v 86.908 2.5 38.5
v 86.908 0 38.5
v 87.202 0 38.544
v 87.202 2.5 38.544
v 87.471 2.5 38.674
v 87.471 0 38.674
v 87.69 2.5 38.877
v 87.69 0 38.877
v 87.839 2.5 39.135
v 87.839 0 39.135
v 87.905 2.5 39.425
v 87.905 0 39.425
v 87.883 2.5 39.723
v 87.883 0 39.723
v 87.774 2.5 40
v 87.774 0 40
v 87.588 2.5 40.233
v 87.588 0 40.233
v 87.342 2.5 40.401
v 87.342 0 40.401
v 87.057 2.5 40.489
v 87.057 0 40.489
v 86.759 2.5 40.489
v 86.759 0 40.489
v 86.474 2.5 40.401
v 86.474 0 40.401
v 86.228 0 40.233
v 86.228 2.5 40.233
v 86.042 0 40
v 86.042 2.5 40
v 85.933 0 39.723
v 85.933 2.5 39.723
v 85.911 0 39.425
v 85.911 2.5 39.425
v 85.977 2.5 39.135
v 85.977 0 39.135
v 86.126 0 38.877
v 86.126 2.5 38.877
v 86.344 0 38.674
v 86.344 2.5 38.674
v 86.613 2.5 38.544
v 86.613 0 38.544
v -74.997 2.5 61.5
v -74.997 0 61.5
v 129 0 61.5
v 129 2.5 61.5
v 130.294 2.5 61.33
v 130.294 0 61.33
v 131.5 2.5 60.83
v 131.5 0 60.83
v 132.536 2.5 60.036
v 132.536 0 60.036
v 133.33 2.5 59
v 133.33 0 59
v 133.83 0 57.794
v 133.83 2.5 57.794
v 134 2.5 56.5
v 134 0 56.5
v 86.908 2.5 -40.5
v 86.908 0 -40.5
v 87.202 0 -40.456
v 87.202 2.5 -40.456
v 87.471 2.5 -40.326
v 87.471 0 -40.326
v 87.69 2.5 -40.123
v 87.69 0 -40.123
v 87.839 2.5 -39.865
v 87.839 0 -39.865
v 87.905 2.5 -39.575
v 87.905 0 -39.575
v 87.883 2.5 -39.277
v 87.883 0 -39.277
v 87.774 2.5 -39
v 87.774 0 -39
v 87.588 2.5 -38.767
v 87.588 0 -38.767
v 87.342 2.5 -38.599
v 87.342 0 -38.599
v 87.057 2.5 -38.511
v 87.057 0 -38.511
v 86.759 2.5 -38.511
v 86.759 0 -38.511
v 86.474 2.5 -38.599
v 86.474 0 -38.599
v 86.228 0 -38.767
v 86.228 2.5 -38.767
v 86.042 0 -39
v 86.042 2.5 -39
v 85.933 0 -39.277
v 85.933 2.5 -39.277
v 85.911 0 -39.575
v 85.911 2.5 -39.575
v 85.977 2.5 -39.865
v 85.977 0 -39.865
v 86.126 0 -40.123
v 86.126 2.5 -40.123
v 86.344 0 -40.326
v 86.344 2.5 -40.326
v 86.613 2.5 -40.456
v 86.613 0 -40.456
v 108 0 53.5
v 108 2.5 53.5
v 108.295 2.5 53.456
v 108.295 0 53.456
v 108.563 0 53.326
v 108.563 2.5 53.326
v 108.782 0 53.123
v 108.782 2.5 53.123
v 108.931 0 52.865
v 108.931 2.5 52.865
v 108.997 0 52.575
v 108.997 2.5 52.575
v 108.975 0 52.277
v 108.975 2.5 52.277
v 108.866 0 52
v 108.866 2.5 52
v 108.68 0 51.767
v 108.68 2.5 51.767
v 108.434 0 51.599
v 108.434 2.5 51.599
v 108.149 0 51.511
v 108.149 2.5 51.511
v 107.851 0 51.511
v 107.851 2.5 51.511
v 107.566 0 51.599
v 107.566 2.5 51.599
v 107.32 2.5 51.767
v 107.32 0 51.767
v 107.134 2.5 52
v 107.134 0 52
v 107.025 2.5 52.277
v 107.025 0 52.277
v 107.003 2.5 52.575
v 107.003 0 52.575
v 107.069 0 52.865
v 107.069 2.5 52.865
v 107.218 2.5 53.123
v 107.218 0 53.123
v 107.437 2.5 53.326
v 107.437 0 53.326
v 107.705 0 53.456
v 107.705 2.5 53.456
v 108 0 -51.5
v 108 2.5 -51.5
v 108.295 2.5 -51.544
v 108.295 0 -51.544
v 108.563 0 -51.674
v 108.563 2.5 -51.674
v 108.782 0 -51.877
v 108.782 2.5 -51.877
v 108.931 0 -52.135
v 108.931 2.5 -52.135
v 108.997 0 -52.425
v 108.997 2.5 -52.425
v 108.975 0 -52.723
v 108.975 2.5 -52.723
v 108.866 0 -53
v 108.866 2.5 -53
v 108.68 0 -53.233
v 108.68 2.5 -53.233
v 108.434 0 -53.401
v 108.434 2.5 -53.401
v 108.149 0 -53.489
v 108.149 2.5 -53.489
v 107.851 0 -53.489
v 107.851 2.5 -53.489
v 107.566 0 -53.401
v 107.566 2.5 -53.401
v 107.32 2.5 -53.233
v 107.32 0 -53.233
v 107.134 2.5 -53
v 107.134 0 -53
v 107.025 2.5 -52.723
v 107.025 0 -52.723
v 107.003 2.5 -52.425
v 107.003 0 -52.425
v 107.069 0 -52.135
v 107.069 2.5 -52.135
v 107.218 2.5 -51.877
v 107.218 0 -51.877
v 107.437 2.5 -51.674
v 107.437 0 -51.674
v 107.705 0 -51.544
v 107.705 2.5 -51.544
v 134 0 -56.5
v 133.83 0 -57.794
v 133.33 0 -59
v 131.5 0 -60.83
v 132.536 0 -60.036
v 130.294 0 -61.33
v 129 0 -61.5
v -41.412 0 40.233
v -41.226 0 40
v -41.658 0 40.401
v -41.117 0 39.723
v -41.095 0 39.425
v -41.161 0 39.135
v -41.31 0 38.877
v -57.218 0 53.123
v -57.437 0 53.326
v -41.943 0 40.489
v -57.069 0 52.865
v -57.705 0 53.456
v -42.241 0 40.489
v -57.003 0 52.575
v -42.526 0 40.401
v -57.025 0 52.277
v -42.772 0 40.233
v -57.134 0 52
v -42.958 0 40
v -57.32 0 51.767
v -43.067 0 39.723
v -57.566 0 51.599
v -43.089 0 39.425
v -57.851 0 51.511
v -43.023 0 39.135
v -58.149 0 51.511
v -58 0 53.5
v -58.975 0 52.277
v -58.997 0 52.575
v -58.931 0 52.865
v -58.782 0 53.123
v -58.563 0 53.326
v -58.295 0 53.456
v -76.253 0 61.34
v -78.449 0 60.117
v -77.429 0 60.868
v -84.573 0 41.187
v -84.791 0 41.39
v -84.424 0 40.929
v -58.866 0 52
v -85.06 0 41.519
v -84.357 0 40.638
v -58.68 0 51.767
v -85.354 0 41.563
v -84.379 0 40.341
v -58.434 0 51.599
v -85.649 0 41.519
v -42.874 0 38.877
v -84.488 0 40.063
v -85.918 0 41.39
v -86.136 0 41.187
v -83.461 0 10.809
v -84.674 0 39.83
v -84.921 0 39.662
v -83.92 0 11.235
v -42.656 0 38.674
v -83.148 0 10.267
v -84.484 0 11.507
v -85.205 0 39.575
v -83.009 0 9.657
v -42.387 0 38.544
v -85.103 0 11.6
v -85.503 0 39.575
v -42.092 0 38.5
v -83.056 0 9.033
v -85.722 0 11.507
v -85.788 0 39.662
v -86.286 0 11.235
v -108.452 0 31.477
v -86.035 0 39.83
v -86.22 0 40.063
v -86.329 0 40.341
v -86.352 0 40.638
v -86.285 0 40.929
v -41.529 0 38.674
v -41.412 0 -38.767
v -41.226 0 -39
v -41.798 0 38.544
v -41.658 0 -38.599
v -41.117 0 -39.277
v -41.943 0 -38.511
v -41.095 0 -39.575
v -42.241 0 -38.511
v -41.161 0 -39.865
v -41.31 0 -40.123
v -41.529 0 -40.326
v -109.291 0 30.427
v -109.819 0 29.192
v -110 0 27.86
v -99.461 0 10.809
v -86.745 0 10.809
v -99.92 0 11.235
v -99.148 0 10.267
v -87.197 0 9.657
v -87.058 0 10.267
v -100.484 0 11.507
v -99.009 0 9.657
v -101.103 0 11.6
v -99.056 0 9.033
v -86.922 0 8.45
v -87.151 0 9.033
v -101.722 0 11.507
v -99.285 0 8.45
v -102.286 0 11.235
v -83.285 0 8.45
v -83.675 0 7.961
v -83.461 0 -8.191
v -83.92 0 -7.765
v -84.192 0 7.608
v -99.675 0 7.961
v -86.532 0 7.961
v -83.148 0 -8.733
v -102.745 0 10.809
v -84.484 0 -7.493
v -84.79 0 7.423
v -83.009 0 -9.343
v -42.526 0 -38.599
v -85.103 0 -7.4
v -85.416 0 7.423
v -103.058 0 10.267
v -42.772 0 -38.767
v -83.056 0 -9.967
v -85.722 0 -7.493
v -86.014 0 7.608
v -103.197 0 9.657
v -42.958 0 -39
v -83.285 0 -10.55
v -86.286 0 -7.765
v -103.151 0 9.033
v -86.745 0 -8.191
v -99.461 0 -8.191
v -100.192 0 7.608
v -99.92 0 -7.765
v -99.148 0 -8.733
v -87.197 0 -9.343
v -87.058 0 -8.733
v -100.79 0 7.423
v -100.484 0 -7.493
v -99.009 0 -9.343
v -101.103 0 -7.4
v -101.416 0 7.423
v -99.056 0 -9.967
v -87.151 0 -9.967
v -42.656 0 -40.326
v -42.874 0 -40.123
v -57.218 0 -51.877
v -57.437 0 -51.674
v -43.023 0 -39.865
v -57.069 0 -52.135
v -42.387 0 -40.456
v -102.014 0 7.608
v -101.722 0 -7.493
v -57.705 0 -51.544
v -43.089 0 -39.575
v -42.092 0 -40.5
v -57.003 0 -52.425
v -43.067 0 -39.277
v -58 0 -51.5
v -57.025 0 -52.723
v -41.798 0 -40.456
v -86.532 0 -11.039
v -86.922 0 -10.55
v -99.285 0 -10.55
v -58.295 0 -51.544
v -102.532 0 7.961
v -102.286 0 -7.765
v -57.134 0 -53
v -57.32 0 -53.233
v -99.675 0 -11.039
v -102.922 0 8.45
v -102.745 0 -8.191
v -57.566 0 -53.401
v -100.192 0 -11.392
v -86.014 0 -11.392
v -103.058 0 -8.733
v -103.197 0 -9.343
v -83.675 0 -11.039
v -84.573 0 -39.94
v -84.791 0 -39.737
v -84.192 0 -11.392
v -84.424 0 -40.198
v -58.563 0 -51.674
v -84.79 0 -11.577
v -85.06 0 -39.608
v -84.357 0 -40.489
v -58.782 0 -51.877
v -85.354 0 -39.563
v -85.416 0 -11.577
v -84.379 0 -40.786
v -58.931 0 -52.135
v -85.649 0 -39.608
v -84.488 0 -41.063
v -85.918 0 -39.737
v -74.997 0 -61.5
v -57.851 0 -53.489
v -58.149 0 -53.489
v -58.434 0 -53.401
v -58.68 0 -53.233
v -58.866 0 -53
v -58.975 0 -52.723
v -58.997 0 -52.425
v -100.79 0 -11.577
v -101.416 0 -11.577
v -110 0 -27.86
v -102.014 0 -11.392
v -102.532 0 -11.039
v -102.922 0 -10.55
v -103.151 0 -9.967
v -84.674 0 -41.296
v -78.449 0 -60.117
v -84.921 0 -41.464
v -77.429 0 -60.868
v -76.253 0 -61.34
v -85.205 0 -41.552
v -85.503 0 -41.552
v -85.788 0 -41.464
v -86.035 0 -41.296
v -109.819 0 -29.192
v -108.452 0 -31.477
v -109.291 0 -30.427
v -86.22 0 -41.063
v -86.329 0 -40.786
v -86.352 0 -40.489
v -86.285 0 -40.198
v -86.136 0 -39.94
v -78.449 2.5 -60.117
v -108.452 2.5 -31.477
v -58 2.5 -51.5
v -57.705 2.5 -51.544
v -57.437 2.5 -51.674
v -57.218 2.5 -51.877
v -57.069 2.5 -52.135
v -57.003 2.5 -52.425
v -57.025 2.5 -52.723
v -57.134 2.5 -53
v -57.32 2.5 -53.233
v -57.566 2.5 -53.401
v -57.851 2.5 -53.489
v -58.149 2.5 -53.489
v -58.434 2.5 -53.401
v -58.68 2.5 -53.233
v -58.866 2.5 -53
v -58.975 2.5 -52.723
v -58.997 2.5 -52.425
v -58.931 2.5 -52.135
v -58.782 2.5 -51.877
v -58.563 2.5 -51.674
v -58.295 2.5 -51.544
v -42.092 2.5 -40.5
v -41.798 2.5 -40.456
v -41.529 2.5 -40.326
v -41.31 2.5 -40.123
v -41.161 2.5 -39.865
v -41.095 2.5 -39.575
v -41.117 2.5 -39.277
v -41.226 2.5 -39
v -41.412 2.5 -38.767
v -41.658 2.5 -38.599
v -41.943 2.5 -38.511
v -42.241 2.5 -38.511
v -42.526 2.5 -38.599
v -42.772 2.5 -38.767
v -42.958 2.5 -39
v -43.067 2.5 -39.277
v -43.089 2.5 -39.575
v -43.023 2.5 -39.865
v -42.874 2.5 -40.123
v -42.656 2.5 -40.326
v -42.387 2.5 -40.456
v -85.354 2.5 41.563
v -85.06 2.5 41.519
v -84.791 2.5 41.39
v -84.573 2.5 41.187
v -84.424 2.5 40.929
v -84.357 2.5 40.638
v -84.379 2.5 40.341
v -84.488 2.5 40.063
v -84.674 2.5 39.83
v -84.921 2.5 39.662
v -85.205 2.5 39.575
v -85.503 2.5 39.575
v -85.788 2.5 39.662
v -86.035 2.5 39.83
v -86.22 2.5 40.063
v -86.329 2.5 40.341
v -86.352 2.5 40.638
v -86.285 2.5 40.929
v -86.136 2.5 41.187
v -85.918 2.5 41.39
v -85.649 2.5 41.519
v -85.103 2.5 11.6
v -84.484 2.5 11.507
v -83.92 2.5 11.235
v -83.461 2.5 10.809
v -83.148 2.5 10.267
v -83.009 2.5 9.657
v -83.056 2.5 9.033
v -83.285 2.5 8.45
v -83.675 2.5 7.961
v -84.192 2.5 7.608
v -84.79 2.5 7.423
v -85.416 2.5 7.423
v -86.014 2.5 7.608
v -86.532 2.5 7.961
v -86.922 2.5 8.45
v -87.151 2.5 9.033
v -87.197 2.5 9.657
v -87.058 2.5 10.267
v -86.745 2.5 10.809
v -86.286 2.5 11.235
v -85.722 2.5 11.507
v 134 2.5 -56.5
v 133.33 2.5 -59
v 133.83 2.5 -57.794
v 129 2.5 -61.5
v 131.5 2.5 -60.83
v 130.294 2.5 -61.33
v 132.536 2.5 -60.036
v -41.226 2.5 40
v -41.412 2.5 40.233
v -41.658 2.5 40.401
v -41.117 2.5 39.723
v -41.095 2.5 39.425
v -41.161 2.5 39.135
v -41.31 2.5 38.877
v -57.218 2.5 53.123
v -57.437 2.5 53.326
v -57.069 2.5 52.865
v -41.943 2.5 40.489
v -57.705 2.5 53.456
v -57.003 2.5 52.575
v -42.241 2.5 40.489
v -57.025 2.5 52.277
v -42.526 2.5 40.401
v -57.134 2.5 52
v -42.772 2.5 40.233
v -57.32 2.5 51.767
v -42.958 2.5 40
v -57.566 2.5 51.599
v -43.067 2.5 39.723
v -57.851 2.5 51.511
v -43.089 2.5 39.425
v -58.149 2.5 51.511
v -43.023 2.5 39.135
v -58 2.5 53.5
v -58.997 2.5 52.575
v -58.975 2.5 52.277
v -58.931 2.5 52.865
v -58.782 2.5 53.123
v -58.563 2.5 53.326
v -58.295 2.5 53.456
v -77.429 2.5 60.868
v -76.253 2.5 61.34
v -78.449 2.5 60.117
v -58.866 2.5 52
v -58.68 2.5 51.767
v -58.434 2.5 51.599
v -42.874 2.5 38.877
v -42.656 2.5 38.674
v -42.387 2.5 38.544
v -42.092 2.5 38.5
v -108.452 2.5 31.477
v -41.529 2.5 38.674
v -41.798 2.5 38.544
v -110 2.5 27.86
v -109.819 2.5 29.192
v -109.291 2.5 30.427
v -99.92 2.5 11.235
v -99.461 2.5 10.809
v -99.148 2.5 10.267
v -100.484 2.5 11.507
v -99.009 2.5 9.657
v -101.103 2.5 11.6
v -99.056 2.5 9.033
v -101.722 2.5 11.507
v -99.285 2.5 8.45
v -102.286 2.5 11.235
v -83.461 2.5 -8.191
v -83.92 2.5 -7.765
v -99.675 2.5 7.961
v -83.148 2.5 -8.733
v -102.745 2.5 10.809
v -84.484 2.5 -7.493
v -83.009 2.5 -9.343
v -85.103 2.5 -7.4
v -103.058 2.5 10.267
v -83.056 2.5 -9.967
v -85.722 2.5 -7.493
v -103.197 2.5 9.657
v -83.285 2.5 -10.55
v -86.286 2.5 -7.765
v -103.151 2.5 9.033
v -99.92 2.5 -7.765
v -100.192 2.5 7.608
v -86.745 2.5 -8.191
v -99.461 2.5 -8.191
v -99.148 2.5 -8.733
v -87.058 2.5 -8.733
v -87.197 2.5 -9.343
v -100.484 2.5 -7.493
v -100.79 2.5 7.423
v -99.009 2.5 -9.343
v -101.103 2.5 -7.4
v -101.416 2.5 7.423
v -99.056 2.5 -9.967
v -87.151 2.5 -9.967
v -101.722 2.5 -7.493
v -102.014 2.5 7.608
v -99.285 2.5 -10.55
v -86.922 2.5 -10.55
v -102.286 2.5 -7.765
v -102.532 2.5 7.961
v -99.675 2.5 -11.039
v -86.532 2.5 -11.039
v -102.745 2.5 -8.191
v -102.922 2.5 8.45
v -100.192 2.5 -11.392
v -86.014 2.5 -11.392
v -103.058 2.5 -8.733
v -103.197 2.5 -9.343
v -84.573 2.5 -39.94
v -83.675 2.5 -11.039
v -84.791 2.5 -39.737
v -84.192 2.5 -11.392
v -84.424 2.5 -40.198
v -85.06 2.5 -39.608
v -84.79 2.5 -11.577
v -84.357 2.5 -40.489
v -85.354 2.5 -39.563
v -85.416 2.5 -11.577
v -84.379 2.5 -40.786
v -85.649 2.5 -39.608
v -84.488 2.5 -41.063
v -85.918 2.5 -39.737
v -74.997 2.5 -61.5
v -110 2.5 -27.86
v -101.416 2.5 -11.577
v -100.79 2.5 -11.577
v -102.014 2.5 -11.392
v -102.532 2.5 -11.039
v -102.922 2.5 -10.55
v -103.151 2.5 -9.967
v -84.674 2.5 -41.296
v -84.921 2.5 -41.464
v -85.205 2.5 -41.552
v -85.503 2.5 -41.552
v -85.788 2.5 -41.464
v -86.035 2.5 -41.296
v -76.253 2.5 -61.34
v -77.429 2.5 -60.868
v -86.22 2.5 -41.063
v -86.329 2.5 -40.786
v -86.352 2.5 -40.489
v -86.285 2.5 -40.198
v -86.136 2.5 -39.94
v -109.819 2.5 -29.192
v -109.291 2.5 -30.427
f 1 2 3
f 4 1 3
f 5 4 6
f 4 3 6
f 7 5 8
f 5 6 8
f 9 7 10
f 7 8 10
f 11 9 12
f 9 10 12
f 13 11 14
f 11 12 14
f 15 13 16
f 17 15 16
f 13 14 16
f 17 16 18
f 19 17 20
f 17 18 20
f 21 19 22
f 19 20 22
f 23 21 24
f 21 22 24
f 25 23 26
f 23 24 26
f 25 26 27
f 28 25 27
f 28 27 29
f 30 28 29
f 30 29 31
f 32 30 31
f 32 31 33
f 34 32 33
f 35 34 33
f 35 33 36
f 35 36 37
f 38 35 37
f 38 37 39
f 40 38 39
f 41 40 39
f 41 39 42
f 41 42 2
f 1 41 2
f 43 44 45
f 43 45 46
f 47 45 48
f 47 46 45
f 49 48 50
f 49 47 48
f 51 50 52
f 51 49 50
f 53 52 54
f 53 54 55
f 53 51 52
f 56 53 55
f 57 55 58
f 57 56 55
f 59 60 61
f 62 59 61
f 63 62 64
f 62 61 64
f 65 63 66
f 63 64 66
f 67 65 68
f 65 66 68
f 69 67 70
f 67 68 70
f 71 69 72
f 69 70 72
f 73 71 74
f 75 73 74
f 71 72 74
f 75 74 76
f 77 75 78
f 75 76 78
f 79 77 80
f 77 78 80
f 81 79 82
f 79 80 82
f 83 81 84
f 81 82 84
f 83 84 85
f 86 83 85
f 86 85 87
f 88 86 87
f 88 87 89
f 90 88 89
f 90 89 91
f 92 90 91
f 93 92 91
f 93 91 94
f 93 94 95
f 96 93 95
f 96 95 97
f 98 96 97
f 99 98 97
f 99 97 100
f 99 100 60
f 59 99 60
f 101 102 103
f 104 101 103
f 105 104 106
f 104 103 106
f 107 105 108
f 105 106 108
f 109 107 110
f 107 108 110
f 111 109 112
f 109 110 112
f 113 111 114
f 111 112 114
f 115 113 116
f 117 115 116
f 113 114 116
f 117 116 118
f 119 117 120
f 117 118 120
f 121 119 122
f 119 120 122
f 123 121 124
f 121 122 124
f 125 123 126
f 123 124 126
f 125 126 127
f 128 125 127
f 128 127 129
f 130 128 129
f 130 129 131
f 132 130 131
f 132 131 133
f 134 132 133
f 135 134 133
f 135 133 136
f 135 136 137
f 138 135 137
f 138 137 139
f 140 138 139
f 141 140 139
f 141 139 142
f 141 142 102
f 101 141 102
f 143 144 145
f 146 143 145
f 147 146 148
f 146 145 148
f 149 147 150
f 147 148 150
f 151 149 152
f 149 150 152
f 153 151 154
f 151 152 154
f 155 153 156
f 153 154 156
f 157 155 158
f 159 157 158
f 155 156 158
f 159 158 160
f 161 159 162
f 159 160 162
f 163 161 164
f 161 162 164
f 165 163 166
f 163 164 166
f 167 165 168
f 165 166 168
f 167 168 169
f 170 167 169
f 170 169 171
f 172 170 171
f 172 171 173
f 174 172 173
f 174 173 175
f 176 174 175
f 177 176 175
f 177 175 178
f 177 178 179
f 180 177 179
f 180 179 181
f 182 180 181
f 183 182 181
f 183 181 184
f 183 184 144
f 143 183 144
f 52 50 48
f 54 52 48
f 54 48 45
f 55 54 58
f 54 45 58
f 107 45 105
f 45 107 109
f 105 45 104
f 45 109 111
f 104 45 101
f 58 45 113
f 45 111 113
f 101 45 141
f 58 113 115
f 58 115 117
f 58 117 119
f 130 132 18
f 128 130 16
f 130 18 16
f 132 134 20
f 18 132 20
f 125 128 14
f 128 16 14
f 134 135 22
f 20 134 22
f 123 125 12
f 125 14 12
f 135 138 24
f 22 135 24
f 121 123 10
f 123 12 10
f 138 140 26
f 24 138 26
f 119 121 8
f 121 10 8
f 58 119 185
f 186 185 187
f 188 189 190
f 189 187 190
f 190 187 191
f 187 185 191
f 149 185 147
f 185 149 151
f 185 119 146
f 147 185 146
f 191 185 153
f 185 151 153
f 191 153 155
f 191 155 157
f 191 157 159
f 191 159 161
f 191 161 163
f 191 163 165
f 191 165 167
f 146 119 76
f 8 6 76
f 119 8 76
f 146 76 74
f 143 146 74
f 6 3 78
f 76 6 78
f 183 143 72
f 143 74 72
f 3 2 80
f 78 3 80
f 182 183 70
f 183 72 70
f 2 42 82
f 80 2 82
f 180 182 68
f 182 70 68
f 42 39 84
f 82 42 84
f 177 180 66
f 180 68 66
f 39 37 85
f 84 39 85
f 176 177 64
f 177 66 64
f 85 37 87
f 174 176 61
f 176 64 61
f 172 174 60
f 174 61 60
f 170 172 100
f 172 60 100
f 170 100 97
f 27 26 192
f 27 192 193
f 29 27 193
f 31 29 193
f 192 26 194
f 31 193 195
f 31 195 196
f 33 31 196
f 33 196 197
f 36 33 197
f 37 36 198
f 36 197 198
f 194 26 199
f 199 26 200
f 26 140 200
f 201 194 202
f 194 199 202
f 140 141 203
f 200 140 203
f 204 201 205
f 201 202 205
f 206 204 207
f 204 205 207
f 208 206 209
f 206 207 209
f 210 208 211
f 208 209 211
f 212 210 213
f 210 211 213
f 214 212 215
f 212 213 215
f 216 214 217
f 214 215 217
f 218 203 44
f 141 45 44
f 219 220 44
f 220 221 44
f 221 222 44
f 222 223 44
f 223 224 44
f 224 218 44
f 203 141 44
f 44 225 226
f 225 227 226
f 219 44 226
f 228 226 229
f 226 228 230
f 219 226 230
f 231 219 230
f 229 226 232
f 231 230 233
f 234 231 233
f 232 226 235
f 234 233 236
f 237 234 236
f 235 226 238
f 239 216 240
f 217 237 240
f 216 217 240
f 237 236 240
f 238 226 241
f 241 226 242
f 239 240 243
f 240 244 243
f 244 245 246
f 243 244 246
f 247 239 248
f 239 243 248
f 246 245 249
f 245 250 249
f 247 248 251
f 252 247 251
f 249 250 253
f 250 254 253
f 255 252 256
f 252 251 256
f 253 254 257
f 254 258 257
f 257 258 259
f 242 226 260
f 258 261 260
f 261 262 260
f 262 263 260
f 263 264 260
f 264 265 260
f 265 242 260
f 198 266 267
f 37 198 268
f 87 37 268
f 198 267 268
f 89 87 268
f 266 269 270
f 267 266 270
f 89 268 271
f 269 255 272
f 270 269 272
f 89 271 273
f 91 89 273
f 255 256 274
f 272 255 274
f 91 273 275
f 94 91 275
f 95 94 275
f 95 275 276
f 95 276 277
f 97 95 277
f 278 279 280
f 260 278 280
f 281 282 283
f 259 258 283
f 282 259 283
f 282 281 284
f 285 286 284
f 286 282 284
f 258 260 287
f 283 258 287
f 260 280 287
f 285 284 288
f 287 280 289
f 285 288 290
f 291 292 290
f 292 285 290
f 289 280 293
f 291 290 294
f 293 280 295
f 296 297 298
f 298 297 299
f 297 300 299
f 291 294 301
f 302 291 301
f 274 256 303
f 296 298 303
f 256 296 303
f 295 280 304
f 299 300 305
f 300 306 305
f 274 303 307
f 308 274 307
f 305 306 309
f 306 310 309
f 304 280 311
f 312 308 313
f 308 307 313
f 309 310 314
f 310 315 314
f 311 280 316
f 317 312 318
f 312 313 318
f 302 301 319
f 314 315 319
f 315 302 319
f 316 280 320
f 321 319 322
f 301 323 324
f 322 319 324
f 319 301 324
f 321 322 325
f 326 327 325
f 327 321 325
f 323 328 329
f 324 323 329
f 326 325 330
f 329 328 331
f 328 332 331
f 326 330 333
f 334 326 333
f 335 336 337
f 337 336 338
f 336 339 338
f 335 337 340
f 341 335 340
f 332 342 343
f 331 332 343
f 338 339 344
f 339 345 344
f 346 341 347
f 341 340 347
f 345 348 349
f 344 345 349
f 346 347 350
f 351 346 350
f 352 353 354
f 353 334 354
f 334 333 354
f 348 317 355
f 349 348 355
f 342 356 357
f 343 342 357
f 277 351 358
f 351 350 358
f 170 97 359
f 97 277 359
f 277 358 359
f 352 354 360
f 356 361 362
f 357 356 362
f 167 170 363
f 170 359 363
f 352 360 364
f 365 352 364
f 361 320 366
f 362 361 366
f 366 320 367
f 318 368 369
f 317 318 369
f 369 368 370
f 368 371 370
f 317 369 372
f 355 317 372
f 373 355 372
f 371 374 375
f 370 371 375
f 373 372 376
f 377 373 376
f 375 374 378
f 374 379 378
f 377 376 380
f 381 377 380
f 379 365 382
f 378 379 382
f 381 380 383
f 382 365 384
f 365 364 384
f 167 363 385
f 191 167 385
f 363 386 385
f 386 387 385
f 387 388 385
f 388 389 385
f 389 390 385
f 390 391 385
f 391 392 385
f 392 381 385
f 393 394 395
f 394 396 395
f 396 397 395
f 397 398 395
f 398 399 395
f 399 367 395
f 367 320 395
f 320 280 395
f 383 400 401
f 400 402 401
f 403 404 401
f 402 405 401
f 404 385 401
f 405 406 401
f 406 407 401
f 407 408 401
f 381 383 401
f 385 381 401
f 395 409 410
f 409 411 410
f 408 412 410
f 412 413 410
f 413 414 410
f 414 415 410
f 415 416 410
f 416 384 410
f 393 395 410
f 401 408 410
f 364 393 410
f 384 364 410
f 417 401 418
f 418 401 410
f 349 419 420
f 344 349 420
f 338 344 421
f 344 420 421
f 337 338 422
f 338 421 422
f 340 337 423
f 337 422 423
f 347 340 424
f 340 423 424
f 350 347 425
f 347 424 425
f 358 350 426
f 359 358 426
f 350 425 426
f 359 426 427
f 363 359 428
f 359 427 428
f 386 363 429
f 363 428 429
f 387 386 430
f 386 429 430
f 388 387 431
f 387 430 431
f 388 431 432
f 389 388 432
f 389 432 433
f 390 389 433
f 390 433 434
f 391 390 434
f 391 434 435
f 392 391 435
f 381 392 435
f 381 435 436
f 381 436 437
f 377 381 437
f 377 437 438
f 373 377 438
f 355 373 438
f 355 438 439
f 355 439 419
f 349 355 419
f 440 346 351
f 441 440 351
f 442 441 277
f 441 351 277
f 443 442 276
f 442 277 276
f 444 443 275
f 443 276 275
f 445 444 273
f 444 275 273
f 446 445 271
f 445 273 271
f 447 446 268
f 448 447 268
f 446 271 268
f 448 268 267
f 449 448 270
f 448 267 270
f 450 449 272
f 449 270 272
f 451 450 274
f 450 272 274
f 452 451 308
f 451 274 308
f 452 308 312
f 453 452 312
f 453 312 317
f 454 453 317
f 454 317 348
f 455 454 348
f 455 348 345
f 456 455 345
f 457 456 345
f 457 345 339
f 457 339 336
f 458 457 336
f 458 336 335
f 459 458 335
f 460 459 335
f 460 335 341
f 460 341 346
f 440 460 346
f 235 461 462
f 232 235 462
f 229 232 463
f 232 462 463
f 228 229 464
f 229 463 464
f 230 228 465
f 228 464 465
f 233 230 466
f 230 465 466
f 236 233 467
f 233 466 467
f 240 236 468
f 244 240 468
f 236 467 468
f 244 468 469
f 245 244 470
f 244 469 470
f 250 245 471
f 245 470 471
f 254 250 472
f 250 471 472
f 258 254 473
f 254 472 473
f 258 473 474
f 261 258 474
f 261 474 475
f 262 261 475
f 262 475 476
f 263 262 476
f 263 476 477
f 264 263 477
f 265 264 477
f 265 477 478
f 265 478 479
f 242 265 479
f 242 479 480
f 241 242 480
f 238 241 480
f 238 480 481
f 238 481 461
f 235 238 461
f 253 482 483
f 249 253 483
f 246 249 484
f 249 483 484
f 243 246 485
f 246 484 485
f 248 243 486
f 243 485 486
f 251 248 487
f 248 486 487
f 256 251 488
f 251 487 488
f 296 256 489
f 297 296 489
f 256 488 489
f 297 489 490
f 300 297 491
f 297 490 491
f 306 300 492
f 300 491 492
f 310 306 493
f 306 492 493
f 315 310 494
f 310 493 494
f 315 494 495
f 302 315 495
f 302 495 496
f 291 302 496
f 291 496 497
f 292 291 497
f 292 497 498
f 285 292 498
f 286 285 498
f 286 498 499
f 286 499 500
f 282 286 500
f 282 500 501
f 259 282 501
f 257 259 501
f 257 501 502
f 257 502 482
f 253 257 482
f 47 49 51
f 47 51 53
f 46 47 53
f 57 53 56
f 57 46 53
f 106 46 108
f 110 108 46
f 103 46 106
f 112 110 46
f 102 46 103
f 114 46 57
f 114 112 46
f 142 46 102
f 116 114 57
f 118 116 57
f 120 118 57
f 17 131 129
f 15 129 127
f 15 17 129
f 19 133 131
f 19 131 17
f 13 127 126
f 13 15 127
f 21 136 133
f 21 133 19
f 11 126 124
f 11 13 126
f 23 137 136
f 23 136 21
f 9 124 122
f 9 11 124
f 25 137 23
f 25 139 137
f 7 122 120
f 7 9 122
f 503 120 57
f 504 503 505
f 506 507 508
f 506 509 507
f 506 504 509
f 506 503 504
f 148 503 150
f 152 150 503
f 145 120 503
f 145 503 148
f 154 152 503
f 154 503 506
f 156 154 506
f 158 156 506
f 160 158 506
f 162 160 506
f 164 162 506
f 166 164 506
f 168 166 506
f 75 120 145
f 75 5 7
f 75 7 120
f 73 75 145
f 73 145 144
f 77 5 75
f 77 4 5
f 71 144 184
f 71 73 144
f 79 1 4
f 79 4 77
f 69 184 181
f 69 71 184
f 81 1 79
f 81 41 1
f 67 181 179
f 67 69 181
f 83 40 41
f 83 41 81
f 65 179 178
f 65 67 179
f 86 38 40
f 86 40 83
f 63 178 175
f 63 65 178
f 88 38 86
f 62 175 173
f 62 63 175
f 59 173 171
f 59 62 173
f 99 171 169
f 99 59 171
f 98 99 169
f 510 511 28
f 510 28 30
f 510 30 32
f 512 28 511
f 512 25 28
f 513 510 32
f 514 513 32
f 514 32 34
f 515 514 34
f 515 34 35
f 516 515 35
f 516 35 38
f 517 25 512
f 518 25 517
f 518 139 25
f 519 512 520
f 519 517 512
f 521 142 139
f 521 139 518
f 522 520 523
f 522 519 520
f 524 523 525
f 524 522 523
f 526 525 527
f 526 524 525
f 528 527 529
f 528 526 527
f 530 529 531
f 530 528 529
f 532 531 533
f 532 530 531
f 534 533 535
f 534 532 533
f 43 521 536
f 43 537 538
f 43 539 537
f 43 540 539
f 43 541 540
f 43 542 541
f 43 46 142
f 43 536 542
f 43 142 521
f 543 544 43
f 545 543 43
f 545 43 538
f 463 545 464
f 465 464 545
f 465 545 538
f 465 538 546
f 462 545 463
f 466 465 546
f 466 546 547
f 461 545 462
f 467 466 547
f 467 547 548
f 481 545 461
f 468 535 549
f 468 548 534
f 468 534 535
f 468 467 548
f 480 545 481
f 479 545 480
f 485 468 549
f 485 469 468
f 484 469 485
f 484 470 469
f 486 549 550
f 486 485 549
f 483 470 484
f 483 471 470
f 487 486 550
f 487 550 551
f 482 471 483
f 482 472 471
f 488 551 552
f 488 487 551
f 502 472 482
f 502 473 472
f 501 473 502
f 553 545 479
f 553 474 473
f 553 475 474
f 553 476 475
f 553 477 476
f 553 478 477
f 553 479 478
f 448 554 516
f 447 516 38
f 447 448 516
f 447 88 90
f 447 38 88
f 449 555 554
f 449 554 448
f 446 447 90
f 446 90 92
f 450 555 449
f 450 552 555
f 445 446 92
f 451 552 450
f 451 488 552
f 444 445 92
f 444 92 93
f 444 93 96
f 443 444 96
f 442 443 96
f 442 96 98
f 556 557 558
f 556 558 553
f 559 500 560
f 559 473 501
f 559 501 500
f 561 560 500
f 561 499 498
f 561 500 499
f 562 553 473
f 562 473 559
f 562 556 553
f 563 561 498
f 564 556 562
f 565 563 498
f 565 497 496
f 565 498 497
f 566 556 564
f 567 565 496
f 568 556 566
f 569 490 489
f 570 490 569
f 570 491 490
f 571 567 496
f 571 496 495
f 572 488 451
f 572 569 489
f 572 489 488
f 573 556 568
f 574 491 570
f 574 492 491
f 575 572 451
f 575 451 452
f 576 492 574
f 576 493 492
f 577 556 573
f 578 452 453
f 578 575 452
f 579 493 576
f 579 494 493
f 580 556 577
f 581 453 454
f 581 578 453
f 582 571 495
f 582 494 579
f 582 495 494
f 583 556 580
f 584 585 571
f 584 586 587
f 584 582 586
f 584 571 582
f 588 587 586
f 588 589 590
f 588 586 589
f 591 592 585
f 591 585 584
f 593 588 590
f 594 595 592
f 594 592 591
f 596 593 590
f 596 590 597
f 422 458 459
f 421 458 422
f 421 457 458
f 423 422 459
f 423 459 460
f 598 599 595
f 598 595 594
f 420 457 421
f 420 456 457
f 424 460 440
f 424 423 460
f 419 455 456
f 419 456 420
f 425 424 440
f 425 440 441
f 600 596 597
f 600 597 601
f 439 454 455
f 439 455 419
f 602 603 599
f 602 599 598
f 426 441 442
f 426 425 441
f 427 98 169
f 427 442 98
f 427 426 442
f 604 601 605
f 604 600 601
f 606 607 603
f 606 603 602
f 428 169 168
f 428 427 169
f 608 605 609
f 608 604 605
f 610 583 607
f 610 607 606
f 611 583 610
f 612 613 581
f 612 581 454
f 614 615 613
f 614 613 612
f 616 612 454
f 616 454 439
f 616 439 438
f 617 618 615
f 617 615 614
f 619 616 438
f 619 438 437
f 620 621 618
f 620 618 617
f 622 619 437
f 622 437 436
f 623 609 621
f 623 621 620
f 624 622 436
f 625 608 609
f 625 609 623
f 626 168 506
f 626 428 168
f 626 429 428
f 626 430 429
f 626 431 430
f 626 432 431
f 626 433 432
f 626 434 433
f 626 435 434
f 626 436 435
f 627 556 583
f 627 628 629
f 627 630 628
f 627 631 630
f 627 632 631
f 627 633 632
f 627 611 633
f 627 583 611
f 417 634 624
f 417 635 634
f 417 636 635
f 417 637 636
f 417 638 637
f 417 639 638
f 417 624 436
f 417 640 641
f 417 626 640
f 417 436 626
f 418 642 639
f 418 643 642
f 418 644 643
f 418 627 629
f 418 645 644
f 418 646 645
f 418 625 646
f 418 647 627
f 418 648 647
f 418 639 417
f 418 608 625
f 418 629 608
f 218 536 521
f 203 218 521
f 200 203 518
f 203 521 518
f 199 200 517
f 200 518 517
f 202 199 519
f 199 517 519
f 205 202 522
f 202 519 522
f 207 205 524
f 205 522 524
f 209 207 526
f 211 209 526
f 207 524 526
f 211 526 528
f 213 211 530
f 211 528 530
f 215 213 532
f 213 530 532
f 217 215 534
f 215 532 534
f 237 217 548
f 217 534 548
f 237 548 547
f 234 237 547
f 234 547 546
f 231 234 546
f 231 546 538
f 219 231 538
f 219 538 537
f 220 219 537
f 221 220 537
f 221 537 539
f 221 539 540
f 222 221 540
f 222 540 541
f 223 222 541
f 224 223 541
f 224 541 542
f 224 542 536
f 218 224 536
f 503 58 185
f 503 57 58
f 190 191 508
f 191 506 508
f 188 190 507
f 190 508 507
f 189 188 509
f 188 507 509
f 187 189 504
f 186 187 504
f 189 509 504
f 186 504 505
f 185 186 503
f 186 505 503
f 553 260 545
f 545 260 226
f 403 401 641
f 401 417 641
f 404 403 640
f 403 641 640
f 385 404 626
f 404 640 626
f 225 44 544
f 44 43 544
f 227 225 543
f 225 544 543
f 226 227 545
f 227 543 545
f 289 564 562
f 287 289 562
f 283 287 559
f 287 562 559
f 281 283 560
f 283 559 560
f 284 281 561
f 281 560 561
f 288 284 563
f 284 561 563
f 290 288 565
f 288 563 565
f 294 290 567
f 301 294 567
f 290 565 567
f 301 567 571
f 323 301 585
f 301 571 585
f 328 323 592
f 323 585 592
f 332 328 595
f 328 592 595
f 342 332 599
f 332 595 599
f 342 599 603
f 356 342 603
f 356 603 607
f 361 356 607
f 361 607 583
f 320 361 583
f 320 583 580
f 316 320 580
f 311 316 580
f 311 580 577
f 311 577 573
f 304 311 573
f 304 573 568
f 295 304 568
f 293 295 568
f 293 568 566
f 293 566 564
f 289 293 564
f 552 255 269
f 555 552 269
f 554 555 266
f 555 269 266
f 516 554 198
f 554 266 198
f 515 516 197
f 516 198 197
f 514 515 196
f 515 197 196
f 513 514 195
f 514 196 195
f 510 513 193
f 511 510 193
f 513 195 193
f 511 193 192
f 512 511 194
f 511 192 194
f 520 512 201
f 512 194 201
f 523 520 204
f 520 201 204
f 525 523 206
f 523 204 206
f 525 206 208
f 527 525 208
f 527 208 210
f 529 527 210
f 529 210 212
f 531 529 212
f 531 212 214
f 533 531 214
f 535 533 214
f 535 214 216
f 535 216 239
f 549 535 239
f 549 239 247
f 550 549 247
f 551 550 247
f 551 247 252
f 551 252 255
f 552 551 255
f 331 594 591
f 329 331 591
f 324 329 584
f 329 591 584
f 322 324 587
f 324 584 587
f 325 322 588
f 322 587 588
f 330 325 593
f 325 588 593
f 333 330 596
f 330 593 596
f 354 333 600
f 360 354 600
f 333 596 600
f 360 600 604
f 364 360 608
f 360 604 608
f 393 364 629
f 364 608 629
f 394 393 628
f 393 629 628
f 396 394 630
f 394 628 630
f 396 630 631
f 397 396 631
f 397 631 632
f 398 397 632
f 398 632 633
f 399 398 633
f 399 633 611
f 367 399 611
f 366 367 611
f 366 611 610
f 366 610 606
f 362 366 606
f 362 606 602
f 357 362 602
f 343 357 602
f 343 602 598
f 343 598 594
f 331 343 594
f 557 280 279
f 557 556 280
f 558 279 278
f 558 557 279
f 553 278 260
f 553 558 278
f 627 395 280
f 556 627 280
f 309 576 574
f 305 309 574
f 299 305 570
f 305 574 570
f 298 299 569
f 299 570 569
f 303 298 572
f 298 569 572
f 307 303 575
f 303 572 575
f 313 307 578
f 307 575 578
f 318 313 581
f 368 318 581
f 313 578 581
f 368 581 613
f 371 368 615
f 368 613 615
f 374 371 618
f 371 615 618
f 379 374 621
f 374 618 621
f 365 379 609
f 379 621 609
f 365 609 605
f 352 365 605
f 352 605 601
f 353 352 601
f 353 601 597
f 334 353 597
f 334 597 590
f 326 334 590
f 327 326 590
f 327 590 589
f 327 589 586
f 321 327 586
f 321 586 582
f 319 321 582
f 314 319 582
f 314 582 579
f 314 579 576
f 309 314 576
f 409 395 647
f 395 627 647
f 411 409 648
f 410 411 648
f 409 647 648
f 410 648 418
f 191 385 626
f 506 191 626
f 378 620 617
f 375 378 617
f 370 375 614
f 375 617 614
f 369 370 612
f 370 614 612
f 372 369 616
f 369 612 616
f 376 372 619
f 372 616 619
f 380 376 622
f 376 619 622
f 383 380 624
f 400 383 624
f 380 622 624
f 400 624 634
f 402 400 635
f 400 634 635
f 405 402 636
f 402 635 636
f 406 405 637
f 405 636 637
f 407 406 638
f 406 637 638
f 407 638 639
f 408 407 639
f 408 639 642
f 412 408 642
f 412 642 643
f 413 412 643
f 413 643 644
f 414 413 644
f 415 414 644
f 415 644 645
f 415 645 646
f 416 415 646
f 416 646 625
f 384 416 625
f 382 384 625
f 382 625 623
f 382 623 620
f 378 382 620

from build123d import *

# Parameters (mm, degrees)
EXTRUDE_2_DEPTH     = 2.5
SKETCH_2_R          = 2.1
CUT_EXTRUDE_1_DEPTH = 127.049593415
SKETCH_3_R          = 1
CUT_EXTRUDE_2_DEPTH = 127.049593415
SKETCH_4_R          = 1
CUT_EXTRUDE_3_DEPTH = 127.049593415
SKETCH_5_W          = 123
SKETCH_5_H          = 2.5
EXTRUDE_3_DEPTH     = 24
FILLET_1_R          = 5
SKETCH_6_R          = 1
CUT_EXTRUDE_4_DEPTH = 148.460164112


with BuildPart() as part:
    # 草图1 → 凸台-拉伸2 (new body)
    with BuildSketch(Plane(origin=(0, 0, 0), x_dir=(1, 0, 0), z_dir=(0, 1, 0))):
        Polygon((-77, 61.5), (-110, 30), (-110, -30), (-77, -61.5), (110, -61.5), (110, 61.5), align=None)
    extrude(amount=EXTRUDE_2_DEPTH)

    # 草图2 → 切除-拉伸1 (cut, through all)
    with BuildSketch(Plane(origin=(0, 2.5, 0), x_dir=(1, 0, 0), z_dir=(0, 1, 0))):
        with Locations(Location((-101.103205615, 9.5, 0), (0, 0, 270))):
            Circle(SKETCH_2_R)
        with Locations(Location((-101.103205615, -9.5, 0), (0, 0, 270))):
            Circle(SKETCH_2_R)
        with Locations(Location((-85.103205615, 9.5, 0), (0, 0, 270))):
            Circle(SKETCH_2_R)
        with Locations(Location((-85.103205615, -9.5, 0), (0, 0, 270))):
            Circle(SKETCH_2_R)
    extrude(amount=-CUT_EXTRUDE_1_DEPTH, mode=Mode.SUBTRACT)

    # 草图3 → 切除-拉伸2 (cut, through all)
    with BuildSketch(Plane(origin=(0, 2.5, 0), x_dir=(1, 0, 0), z_dir=(0, 1, 0))):
        with Locations(Location((-58, 52.5, 0), (0, 0, 270))):
            Circle(SKETCH_3_R)
        with Locations(Location((-58, -52.5, 0), (0, 0, 270))):
            Circle(SKETCH_3_R)
        with Locations(Location((108, -52.5, 0), (0, 0, 270))):
            Circle(SKETCH_3_R)
        with Locations(Location((108, 52.5, 0), (0, 0, 270))):
            Circle(SKETCH_3_R)
    extrude(amount=-CUT_EXTRUDE_2_DEPTH, mode=Mode.SUBTRACT)

    # 草图4 → 切除-拉伸3 (cut, through all)
    with BuildSketch(Plane.XZ):
        with Locations(Location((-42.09228043, 39.5, 0), (0, 0, 270))):
            Circle(SKETCH_4_R)
        with Locations(Location((-42.09228043, -39.5, 0), (0, 0, 270))):
            Circle(SKETCH_4_R)
        with Locations(Location((86.90771957, 39.5, 0), (0, 0, 270))):
            Circle(SKETCH_4_R)
        with Locations(Location((86.90771957, -39.5, 0), (0, 0, 270))):
            Circle(SKETCH_4_R)
    extrude(amount=-CUT_EXTRUDE_3_DEPTH, mode=Mode.SUBTRACT)

    # 草图5 → 凸台-拉伸3 (add)
    with BuildSketch(Plane(origin=(110, 0, 0), x_dir=(0, 0, -1), z_dir=(1, 0, 0))):
        with Locations((0, 1.25)):
            Rectangle(SKETCH_5_W, SKETCH_5_H)
    extrude(amount=EXTRUDE_3_DEPTH)

    # 圆角1
    fillet_1_edges = [part.edges().sort_by_distance(p)[0] for p in [
        (-110, 1.25, -30),
        (-77, 1.25, -61.5),
        (-77, 1.25, 61.5),
        (-110, 1.25, 30),
        (134, 1.25, 61.5),
        (134, 1.25, -61.5),
    ]]
    fillet(fillet_1_edges, radius=FILLET_1_R)

    # 草图6 → 切除-拉伸4 (cut, through all)
    with BuildSketch(Plane(origin=(0, 2.5, 0), x_dir=(1, 0, 0), z_dir=(0, 1, 0))):
        with Locations(Location((-85.354419484, 40.563392731, 0), (0, 0, 270))):
            Circle(SKETCH_6_R)
        with Locations(Location((-85.354419484, -40.563392731, 0), (0, 0, 270))):
            Circle(SKETCH_6_R)
    extrude(amount=-CUT_EXTRUDE_4_DEPTH, mode=Mode.SUBTRACT)


solid = part.part
